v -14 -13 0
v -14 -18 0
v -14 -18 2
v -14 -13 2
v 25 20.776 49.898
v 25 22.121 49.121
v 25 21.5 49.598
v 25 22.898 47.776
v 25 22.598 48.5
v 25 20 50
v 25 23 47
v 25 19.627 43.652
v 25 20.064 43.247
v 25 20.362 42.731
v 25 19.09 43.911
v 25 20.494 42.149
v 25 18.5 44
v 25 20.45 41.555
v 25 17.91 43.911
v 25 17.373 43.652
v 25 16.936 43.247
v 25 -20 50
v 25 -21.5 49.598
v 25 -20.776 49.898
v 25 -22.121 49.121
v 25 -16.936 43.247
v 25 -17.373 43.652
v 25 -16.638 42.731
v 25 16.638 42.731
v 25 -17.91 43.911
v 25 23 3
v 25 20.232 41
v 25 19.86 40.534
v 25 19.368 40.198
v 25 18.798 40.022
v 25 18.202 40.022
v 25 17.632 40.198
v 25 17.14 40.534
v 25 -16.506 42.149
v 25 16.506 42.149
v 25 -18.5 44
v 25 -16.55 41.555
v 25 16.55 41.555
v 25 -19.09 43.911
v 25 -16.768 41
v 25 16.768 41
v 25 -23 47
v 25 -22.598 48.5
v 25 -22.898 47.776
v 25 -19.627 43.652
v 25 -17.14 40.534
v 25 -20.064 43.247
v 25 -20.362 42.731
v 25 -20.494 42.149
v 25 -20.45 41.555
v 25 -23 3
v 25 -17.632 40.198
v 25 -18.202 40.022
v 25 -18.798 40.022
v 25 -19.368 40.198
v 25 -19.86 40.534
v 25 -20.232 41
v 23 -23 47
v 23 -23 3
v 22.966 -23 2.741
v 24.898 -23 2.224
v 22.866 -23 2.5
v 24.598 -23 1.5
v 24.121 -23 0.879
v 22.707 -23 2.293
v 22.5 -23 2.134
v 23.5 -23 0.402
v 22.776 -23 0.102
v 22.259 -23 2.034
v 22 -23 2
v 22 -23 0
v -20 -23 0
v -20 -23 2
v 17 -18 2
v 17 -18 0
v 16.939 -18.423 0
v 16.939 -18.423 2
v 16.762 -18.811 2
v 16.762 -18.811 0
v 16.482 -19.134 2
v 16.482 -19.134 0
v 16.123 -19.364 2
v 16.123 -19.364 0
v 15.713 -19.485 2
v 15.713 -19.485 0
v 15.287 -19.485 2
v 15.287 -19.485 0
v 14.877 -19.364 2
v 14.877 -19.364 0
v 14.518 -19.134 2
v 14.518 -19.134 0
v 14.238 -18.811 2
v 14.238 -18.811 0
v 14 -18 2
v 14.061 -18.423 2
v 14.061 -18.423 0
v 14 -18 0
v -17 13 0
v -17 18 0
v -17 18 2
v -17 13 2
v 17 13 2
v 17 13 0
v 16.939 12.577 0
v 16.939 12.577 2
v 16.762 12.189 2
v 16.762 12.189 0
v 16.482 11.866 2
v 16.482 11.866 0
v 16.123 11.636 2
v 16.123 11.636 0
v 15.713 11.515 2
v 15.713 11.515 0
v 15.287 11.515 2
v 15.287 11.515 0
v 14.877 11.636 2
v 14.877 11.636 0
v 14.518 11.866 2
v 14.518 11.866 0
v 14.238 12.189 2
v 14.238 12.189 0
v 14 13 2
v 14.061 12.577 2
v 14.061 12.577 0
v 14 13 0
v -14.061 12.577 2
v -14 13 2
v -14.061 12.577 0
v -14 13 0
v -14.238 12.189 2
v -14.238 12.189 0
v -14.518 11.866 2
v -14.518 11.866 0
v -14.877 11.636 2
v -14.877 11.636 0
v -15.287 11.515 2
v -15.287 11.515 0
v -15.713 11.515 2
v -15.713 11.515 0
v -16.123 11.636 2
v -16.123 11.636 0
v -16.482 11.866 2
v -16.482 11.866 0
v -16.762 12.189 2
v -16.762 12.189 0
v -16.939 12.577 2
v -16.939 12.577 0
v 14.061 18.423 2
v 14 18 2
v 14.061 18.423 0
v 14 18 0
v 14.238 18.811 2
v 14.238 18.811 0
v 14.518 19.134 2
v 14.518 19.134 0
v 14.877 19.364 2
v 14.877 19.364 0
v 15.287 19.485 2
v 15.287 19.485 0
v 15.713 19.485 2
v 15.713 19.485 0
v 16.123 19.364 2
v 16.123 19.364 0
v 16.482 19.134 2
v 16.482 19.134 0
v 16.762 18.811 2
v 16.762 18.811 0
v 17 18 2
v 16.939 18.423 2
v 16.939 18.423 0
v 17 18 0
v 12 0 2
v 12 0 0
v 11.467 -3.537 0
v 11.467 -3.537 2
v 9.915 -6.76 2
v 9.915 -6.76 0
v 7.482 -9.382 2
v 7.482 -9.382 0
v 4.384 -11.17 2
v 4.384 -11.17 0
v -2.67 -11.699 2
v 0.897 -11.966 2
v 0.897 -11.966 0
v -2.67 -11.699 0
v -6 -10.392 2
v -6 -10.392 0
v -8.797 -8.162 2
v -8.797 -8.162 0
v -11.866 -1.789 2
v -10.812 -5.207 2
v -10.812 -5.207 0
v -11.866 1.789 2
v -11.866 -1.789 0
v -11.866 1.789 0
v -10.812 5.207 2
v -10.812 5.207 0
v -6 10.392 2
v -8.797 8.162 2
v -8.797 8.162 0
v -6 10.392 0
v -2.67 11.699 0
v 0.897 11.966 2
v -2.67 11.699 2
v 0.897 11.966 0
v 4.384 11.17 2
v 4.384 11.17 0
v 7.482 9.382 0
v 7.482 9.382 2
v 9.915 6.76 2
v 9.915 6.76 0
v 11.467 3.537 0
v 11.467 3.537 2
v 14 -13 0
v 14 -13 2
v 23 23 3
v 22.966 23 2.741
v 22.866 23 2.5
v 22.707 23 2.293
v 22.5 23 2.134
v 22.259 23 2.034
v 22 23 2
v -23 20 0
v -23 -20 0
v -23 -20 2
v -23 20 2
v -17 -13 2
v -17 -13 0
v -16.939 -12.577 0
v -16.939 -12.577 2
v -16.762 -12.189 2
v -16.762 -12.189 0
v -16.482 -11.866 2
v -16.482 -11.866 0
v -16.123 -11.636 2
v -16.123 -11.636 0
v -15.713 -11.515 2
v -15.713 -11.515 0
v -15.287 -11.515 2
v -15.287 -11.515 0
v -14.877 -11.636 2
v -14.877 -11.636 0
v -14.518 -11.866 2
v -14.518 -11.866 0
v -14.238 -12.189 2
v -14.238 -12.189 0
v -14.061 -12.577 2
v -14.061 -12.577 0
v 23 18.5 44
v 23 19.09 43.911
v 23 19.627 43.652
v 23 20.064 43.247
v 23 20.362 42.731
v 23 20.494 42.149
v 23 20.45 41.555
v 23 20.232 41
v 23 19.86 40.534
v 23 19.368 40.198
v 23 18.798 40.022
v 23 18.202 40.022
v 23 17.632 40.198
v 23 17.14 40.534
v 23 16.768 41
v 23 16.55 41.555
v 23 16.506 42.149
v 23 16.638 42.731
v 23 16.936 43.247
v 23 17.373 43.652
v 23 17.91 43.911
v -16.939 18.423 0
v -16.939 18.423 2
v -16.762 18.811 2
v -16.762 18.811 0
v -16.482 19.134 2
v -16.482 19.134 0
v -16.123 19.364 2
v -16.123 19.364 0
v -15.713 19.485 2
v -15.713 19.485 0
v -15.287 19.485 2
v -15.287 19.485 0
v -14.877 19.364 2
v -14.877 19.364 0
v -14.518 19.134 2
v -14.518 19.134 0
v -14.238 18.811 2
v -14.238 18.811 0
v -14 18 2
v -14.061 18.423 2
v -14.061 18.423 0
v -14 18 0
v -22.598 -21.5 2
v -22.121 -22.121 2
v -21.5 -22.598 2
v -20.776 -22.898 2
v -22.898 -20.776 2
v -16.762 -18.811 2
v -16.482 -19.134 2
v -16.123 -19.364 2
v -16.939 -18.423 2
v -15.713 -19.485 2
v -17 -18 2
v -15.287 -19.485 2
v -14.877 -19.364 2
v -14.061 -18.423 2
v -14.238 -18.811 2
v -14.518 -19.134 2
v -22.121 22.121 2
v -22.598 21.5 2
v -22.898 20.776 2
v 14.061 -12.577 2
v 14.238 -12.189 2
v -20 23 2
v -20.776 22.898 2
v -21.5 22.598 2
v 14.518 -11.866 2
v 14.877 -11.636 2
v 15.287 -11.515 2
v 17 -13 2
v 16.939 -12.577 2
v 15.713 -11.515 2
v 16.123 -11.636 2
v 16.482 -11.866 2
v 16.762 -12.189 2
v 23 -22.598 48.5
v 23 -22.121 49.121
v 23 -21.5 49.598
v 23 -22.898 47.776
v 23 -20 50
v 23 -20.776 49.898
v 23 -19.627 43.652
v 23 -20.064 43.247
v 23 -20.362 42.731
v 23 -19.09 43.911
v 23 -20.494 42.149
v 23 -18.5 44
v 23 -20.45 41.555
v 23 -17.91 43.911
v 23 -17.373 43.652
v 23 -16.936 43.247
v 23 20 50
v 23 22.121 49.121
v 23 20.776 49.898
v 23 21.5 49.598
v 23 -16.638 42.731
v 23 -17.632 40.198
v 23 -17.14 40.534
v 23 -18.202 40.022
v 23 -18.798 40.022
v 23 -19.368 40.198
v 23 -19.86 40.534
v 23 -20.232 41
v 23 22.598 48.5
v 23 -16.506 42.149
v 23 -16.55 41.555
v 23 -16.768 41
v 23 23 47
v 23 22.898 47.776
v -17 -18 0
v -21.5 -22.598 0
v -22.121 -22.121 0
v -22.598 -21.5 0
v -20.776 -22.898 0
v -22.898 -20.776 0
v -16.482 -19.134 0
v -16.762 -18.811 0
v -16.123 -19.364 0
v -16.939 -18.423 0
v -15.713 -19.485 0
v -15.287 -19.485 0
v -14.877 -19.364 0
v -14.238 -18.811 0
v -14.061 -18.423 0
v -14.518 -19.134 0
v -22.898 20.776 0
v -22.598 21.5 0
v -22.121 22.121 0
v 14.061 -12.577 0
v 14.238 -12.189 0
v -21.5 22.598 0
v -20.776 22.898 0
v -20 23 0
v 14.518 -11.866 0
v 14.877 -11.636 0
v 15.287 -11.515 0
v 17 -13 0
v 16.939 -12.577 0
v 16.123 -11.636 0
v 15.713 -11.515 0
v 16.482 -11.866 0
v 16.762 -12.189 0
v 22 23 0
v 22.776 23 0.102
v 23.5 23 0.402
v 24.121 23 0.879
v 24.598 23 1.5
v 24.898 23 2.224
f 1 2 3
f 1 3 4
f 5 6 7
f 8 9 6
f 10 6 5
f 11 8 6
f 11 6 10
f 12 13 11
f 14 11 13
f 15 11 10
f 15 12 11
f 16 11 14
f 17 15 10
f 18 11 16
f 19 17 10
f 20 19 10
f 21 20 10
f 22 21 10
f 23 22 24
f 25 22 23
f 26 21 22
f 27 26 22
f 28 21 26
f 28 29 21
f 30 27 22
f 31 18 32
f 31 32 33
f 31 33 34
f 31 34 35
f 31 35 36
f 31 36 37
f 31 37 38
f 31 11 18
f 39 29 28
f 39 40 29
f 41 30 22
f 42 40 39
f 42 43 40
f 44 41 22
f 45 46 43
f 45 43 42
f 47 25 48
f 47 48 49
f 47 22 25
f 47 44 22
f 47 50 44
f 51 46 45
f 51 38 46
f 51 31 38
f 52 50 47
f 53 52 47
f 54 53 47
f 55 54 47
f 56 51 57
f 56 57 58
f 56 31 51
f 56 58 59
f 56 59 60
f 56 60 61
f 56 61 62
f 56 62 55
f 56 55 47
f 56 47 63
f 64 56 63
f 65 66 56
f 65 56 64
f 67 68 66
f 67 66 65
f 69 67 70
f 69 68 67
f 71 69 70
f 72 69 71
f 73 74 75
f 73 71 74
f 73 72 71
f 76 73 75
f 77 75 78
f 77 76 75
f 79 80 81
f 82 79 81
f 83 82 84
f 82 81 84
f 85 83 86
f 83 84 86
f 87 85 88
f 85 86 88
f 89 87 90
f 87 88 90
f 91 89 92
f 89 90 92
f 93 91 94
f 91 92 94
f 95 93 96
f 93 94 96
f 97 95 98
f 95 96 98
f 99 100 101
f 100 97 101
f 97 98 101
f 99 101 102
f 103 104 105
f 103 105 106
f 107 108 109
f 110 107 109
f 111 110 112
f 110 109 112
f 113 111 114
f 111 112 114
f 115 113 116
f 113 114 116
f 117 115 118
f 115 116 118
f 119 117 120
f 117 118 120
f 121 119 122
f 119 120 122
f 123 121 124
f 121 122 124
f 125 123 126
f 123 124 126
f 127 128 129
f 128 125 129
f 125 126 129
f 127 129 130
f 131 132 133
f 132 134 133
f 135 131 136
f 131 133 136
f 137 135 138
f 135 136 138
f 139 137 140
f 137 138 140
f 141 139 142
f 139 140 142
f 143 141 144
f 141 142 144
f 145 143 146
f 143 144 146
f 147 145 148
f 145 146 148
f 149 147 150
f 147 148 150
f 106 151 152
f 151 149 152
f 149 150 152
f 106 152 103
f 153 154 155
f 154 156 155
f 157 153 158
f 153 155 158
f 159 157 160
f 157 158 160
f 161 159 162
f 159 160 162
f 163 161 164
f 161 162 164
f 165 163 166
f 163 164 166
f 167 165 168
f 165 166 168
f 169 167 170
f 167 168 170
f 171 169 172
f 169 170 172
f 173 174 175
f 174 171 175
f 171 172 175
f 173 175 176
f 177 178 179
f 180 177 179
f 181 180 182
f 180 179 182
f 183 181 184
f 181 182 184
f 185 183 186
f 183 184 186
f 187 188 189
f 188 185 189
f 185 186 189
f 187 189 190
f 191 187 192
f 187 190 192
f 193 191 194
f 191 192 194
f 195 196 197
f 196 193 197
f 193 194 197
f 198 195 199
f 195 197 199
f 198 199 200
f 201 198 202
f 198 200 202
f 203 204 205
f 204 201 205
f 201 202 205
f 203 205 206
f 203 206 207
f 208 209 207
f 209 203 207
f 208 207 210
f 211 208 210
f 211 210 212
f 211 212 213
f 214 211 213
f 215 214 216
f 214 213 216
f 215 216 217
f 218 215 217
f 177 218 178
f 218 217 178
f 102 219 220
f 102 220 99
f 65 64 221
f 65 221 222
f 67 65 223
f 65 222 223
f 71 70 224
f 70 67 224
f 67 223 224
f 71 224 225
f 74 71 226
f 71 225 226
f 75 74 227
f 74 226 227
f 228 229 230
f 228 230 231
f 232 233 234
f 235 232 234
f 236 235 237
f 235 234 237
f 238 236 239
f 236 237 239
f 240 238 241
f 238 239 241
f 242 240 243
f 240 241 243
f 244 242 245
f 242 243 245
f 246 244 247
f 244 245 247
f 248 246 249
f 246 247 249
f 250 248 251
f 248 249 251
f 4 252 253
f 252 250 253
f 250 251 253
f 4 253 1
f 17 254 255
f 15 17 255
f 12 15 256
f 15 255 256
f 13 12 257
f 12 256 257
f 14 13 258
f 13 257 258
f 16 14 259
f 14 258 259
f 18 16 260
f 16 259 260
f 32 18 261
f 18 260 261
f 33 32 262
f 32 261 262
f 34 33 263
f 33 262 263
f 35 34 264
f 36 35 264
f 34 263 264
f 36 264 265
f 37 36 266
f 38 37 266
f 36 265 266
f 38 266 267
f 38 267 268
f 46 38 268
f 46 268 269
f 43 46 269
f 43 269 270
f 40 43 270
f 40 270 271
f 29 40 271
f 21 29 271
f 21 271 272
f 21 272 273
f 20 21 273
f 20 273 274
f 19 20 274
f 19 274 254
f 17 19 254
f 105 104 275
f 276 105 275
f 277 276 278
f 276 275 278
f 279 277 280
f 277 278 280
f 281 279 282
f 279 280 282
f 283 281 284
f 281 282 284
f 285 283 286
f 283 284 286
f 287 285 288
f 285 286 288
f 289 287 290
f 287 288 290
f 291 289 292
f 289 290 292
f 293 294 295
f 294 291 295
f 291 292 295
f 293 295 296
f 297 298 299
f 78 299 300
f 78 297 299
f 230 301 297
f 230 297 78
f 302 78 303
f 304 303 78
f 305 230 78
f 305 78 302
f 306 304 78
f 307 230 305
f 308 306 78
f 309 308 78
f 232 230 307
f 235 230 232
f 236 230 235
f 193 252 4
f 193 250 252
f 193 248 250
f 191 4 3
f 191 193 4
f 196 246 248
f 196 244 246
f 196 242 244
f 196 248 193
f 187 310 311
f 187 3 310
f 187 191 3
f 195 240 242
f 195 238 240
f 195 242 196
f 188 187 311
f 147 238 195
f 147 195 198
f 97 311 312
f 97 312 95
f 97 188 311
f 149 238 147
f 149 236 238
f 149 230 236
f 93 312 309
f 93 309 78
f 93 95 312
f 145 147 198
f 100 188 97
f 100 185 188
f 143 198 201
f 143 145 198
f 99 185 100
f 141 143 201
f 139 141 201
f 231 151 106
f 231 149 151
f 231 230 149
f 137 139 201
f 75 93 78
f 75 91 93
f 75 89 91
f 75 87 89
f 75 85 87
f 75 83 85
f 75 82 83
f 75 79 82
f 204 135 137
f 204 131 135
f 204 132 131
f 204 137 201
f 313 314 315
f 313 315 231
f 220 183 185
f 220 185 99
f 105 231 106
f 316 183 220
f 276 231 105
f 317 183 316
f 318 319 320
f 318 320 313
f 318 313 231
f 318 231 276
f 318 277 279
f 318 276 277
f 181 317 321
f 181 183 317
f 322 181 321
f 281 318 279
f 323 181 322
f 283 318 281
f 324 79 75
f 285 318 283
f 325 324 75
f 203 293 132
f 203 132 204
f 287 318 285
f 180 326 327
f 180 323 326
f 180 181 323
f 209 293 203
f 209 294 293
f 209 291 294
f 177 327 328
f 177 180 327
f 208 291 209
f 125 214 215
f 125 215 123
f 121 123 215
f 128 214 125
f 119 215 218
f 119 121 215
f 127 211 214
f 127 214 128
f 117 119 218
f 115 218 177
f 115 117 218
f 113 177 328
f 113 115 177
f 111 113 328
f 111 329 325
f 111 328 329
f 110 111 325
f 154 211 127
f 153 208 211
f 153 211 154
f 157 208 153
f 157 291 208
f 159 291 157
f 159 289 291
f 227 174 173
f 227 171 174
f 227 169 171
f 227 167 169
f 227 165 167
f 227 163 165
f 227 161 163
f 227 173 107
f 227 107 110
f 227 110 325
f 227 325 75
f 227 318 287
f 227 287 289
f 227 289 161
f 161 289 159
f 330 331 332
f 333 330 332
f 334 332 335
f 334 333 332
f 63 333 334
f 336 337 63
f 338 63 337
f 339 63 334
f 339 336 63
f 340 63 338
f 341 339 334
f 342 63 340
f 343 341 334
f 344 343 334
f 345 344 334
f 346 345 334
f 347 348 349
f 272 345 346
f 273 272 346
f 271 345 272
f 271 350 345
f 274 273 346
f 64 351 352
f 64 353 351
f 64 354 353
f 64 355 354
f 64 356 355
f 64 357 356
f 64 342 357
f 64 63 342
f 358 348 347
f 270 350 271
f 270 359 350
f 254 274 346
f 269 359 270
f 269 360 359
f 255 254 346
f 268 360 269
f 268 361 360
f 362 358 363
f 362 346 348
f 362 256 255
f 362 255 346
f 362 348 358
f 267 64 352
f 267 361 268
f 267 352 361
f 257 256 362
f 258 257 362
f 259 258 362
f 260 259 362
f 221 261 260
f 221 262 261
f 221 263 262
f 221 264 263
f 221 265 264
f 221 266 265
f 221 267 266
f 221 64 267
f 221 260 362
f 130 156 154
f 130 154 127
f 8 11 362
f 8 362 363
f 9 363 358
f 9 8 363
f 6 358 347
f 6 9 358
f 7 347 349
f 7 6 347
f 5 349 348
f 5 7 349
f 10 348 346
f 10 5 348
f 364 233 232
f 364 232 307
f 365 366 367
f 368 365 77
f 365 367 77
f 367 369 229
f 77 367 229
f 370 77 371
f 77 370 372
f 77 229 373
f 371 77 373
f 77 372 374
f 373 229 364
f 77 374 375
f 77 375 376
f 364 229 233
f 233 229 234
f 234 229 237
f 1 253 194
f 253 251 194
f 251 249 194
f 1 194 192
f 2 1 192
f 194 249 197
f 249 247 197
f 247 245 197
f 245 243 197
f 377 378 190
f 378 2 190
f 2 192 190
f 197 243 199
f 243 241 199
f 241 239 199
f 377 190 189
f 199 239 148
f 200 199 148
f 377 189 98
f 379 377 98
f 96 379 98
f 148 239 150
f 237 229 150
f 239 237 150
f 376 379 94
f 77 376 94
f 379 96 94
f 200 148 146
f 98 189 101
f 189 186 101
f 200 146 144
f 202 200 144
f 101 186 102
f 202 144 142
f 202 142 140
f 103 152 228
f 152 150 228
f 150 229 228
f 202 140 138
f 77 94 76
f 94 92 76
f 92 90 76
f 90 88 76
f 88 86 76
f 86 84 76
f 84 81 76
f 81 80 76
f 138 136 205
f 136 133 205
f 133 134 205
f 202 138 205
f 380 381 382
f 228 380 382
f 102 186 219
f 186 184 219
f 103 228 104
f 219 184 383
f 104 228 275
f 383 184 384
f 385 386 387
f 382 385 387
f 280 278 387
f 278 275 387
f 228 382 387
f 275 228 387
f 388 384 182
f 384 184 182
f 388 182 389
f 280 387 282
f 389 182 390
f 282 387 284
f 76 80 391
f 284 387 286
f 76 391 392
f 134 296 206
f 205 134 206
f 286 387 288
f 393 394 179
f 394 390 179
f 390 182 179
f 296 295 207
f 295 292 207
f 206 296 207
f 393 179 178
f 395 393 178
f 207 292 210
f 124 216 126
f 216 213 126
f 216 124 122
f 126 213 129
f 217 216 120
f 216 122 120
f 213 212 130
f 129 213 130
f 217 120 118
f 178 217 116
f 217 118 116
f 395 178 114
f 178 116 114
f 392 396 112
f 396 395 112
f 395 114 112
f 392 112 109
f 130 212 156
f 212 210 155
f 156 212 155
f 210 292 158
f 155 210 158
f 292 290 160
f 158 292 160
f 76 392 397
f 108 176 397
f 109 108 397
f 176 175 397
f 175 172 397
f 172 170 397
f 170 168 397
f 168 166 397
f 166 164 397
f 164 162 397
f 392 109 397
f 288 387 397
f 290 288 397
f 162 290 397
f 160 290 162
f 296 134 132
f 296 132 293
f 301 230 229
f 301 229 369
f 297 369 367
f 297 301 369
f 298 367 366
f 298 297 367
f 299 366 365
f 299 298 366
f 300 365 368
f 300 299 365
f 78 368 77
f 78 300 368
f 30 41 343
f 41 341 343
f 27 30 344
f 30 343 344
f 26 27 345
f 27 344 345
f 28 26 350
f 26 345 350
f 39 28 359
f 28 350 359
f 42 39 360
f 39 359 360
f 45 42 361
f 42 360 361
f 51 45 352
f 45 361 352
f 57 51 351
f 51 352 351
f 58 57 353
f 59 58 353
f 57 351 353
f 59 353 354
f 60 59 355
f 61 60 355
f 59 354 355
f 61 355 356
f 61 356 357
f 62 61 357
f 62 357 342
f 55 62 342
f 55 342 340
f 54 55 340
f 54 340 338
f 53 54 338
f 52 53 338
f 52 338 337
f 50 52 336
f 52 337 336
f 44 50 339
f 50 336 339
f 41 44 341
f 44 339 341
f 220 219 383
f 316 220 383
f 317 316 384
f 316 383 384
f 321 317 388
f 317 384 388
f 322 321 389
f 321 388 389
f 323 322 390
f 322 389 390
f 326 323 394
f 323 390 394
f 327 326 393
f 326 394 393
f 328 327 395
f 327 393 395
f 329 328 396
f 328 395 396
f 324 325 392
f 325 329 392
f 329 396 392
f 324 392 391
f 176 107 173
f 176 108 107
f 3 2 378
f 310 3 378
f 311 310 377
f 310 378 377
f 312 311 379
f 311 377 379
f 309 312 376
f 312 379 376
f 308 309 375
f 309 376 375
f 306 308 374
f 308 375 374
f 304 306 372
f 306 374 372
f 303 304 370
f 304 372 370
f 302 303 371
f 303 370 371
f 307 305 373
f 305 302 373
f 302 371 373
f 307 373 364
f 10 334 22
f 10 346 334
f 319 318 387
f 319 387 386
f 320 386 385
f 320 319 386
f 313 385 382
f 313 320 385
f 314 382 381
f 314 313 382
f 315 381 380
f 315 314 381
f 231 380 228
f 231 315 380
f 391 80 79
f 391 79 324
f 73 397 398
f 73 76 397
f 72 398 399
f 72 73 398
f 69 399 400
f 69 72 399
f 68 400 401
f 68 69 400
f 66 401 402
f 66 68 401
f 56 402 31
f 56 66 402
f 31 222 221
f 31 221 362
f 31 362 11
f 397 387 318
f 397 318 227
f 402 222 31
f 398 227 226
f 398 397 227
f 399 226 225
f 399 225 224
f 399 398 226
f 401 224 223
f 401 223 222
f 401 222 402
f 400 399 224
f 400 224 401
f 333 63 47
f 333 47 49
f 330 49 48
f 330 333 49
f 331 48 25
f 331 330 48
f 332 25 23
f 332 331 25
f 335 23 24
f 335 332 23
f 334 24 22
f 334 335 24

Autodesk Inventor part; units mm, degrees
ref_plane "YZ Plane" through (0, 0, 0) normal (1, 0, 0) x (0, 1, 0)
ref_plane "XZ Plane" through (0, 0, 0) normal (0, 1, 0) x (-1, 0, 0)
ref_plane "XY Plane" through (0, 0, 0) normal (0, 0, 1) x (1, 0, 0)
sketch "Эскиз1" plane through (0, 0, 0) normal (0, 0, 1) x (1, 0, 0)
  circle A0 centre (0, 0) radius 12
  line L0 (0, 0) -> (0, 33) construction
  line L1 (0, 0) -> (-30.4422, 0) construction
  line L2 (-23, 23) -> (25, 23)
  line L3 (25, 23) -> (25, -23)
  line L4 (25, -23) -> (-23, -23)
  line L5 (-23, -23) -> (-23, 23)
  line L6 (15.5, 15.5) -> (-15.5, 15.5) construction
  line L7 (-15.5, 15.5) -> (-15.5, -15.5) construction
  line L8 (15.5, -15.5) -> (15.5, 15.5) construction
  line L9 (-15.5, 15.5) -> (15.5, -15.5) construction
  circle A1 centre (-15.5, 15.5) radius 1.5
  circle A2 centre (15.5, 15.5) radius 1.5
  circle A3 centre (-15.5, -15.5) radius 1.5
  circle A4 centre (15.5, -15.5) radius 1.5
  line L10 (51, 23) -> (51, -23) construction
  line L11 (-25.1704, 23) -> (21, 23) construction
  line L12 (21, -23) -> (-25.1704, -23) construction
  line L13 (-15.5, -13) -> (-15.5, -18) construction
  line L14 (-17, -13) -> (-17, -18)
  line L15 (-14, -18) -> (-14, -13)
  arc A5 (-14, -13) -> (-17, -13) centre (-15.5, -13) ccw
  arc A6 (-17, -18) -> (-14, -18) centre (-15.5, -18) ccw
  line L16 (-15.5, 18) -> (-15.5, 13) construction
  line L17 (-17, 18) -> (-17, 13)
  line L18 (-14, 13) -> (-14, 18)
  arc A7 (-14, 18) -> (-17, 18) centre (-15.5, 18) ccw
  arc A8 (-17, 13) -> (-14, 13) centre (-15.5, 13) ccw
  line L19 (15.5, 18) -> (15.5, 13) construction
  line L20 (14, 18) -> (14, 13)
  line L21 (17, 13) -> (17, 18)
  arc A9 (17, 18) -> (14, 18) centre (15.5, 18) ccw
  arc A10 (14, 13) -> (17, 13) centre (15.5, 13) ccw
  line L22 (15.5, -13) -> (15.5, -18) construction
  line L23 (14, -13) -> (14, -18)
  line L24 (17, -18) -> (17, -13)
  arc A11 (17, -13) -> (14, -13) centre (15.5, -13) ccw
  arc A12 (14, -18) -> (17, -18) centre (15.5, -18) ccw
  dimension "d0" = 24
  dimension "d1" = 31
  dimension "d2" = 31
  dimension "d3" = 3
  dimension "d4" = 3
  dimension "d5" = 3
  dimension "d6" = 3
  dimension "d7" = 46
  dimension "d51" = 48
  dimension "d52" = 23
  dimension "d53" = 8
  dimension "d54" = 8
  dimension "d55" = 8
  dimension "d56" = 8
extrude "Выдавливание4" add sketch "Эскиз1" along normal blind 2
sketch "Эскиз3" plane through (0, 0, 2) normal (0, 0, 1) x (1, 0, 0)
  line L0 (25, -23) -> (23, -23)
  line L1 (23, -23) -> (23, 23)
  line L2 (23, 23) -> (25, 23)
  line L3 (25, 23) -> (25, -23)
  line L4 (-23, 23) -> (-23, -23) projected
  line L5 (25, -23) -> (-23, -23) projected
  line L6 (-23, 23) -> (25, 23) projected
  line L7 (25, -23) -> (25, 23) projected
  point P0 (0, 0)
  dimension "d32" = 2
extrude "Выдавливание5" add sketch "Эскиз3" along normal blind 48 contours L0 L1 L2 L3
sketch "Эскиз4" plane through (23, -23, 2) normal (-1, 0, 0) x (0, 0, 1)
  line L0 (40, 4.5) -> (40, 41.5) construction
  circle A0 centre (40, 41.5) radius 2
  circle A1 centre (40, 4.5) radius 2
  line L1 (0, 41) -> (0, 1)
  line L2 (48, 46) -> (48, 0) projected
  line L3 (48, 23) -> (59.018, 23)
  point P0 (20, 21)
  dimension "d42" = 4
  dimension "d43" = 4
  dimension "d50" = 37
  dimension "d60" = 8
extrude "Выдавливание6" cut sketch "Эскиз4" against normal blind 10
fillet "Сопряжение2" radius 1 1 edges at (23, 0, 2)
fillet "Сопряжение3" radius 3 1 edges at (25, 0, 0)
fillet "Сопряжение4" radius 3 4 edges at (-23, -23, 1) (-23, 23, 1) (24, 23, 50) (24, -23, 50)
properties part number "Plastina  motor"
